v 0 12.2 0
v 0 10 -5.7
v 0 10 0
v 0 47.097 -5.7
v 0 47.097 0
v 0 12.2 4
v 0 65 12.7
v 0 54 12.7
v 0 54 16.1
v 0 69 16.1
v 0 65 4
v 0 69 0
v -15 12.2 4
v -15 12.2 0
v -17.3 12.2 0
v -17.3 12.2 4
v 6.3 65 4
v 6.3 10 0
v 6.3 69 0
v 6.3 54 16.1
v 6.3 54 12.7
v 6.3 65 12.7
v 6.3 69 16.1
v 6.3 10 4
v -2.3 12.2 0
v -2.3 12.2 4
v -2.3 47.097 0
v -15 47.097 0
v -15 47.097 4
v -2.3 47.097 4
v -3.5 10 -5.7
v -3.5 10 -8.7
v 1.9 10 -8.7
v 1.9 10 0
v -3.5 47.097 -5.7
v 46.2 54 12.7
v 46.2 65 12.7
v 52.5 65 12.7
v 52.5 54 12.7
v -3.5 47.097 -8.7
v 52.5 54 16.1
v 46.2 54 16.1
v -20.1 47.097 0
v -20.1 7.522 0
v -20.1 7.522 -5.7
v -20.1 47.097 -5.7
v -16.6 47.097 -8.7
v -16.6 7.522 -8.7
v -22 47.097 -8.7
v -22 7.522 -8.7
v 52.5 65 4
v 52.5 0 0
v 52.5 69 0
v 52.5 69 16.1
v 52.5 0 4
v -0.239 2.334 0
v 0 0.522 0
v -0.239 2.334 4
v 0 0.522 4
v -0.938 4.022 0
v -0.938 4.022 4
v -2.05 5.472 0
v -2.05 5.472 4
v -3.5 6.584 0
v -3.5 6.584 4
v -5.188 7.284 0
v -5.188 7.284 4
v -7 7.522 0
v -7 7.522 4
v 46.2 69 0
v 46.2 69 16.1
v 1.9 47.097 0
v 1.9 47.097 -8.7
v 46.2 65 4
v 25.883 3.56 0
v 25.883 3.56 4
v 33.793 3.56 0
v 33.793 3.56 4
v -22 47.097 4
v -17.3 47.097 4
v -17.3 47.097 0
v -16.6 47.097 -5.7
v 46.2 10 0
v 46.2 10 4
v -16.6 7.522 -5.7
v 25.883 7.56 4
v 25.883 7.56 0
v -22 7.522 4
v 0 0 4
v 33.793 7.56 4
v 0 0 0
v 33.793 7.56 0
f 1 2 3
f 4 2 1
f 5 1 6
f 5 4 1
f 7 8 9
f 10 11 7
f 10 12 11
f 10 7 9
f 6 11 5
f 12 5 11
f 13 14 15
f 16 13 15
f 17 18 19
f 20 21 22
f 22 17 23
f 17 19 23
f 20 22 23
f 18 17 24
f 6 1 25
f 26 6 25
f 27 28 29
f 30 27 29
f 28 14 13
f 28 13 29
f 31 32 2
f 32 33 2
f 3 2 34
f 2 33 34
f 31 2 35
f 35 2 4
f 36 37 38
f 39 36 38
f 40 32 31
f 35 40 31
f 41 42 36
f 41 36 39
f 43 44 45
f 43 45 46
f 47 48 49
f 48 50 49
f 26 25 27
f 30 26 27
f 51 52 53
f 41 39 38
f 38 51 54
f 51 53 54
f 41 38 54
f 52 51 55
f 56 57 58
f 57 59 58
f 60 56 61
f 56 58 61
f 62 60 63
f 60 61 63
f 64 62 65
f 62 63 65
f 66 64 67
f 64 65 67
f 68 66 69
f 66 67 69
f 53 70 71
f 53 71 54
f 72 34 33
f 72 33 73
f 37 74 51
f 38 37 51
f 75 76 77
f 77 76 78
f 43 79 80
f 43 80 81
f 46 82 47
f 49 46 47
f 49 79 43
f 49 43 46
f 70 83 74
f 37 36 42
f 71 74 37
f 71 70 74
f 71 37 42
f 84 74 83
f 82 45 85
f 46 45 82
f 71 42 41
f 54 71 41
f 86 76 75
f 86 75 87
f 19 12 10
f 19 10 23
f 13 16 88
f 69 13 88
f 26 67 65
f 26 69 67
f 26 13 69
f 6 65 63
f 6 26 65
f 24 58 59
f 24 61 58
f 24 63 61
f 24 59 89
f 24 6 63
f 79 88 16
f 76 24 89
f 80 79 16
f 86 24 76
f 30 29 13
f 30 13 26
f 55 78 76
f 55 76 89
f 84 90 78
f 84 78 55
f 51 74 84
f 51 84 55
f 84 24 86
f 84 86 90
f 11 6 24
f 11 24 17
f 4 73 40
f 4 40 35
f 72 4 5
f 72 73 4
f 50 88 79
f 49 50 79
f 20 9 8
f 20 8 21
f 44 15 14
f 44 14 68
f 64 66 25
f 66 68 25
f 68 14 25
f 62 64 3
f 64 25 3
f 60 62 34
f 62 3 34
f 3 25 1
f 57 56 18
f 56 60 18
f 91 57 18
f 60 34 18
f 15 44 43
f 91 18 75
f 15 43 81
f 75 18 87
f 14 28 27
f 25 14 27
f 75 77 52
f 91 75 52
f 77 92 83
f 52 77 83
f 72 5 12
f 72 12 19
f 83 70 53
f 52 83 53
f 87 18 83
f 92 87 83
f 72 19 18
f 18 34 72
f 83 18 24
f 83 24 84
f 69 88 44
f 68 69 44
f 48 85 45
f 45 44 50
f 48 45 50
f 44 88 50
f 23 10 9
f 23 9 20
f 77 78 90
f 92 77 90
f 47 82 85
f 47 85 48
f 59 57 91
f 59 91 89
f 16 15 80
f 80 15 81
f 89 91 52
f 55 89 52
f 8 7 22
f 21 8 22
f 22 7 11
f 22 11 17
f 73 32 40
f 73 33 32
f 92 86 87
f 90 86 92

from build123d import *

# Parameters (mm, degrees)
SKETCH_1_W          = 6.3
SKETCH_1_H          = 59
SKETCH_1_W_2        = 52.5
SKETCH_1_H_2        = 10
EXTRUDE_1_DEPTH     = 4
SKETCH_2_W          = 6.3
SKETCH_2_H          = 4
EXTRUDE_2_DEPTH     = 12.1
SKETCH_3_W          = 6.3
SKETCH_3_H          = 3.4
EXTRUDE_3_DEPTH     = 11
SKETCH_4_W          = 6.3
SKETCH_4_H          = 3.4
EXTRUDE_4_DEPTH     = 11
SKETCH_5_W          = 4
SKETCH_5_H          = 39.574889558
EXTRUDE_5_DEPTH     = 22
SKETCH_6_W          = 2.3
SKETCH_6_H          = 37
CUT_EXTRUDE_1_DEPTH = 89.184238955
FILLET_1_R          = 7
SKETCH_7_W          = 7.91
SKETCH_7_H          = 4
CUT_EXTRUDE_2_DEPTH = 88.542332617
SKETCH_8_W          = 1.9
SKETCH_8_H          = 39.574889558
SKETCH_8_H_2        = 37.097175278
EXTRUDE_6_DEPTH     = 12.7
SKETCH_9_W          = 3
SKETCH_9_H          = 39.574889558
EXTRUDE_7_DEPTH     = 3.5
SKETCH_10_W         = 3
SKETCH_10_H         = 37.097175278
EXTRUDE_8_DEPTH     = 3.5


with BuildPart() as part:
    # Эскиз1 → Бобышка-Вытянуть1 (new body)
    with BuildSketch(Plane.XY):
        with Locations((3.15, 39.5)):
            Rectangle(SKETCH_1_W, SKETCH_1_H)
        with Locations((26.25, 5)):
            Rectangle(SKETCH_1_W_2, SKETCH_1_H_2)
        with Locations((49.35, 39.5)):
            Rectangle(SKETCH_1_W, SKETCH_1_H)
    extrude(amount=EXTRUDE_1_DEPTH)

    # Эскиз2 → Бобышка-Вытянуть2 (add)
    with BuildSketch(Plane.XY.offset(4)):
        with Locations((3.15, 67)):
            Rectangle(SKETCH_2_W, SKETCH_2_H)
        with Locations((49.35, 67)):
            Rectangle(SKETCH_2_W, SKETCH_2_H)
    extrude(amount=EXTRUDE_2_DEPTH)

    # Эскиз3 → Бобышка-Вытянуть3 (add)
    with BuildSketch(Plane.XZ.offset(-65)):
        with Locations((49.35, 14.4)):
            Rectangle(SKETCH_3_W, SKETCH_3_H)
    extrude(amount=EXTRUDE_3_DEPTH)

    # Эскиз4 → Бобышка-Вытянуть4 (add)
    with BuildSketch(Plane.XZ.offset(-65)):
        with Locations((3.15, 14.4)):
            Rectangle(SKETCH_4_W, SKETCH_4_H)
    extrude(amount=EXTRUDE_4_DEPTH)

    # Эскиз5 → Бобышка-Вытянуть5 (add)
    with BuildSketch(Plane.ZY):
        with Locations((2, 27.309730499)):
            Rectangle(SKETCH_5_W, SKETCH_5_H)
    extrude(amount=EXTRUDE_5_DEPTH)

    # Эскиз6 → Вырез-Вытянуть1 (cut, through all)
    with BuildSketch(Plane(origin=(0, 0, 0), x_dir=(-1, 0, 0), z_dir=(0, 0, -1))):
        with Locations((1.15, 30.7)):
            Rectangle(SKETCH_6_W, SKETCH_6_H)
        with Locations((16.15, 30.7)):
            Rectangle(SKETCH_6_W, SKETCH_6_H)
    extrude(amount=-CUT_EXTRUDE_1_DEPTH, mode=Mode.SUBTRACT)

    # Скругление1
    fillet_1_edges = [part.edges().sort_by_distance(p)[0] for p in [
        (0, 7.52228572, 2),
    ]]
    fillet(fillet_1_edges, radius=FILLET_1_R)

    # Эскиз7 → Вырез-Вытянуть2 (cut, through all)
    with BuildSketch(Plane.XY.offset(4)):
        with Locations((29.837829831, 5.560133135)):
            Rectangle(SKETCH_7_W, SKETCH_7_H)
    extrude(amount=-CUT_EXTRUDE_2_DEPTH, mode=Mode.SUBTRACT)

    # Эскиз8 → Бобышка-Вытянуть6 (add)
    with BuildSketch(Plane.XY.offset(4)):
        with Locations((-21.05, 27.309730499)):
            Rectangle(SKETCH_8_W, SKETCH_8_H)
        with Locations((0.95, 28.548587639)):
            Rectangle(SKETCH_8_W, SKETCH_8_H_2)
    extrude(amount=-EXTRUDE_6_DEPTH)

    # Эскиз9 → Бобышка-Вытянуть7 (add)
    with BuildSketch(Plane(origin=(-20.1, 0, 0), x_dir=(0, 0, -1), z_dir=(1, 0, 0))):
        with Locations((7.2, 27.309730499)):
            Rectangle(SKETCH_9_W, SKETCH_9_H)
    extrude(amount=EXTRUDE_7_DEPTH)

    # Эскиз10 → Бобышка-Вытянуть8 (add)
    with BuildSketch(Plane.ZY):
        with Locations((-7.2, 28.548587639)):
            Rectangle(SKETCH_10_W, SKETCH_10_H)
    extrude(amount=EXTRUDE_8_DEPTH)


solid = part.part
